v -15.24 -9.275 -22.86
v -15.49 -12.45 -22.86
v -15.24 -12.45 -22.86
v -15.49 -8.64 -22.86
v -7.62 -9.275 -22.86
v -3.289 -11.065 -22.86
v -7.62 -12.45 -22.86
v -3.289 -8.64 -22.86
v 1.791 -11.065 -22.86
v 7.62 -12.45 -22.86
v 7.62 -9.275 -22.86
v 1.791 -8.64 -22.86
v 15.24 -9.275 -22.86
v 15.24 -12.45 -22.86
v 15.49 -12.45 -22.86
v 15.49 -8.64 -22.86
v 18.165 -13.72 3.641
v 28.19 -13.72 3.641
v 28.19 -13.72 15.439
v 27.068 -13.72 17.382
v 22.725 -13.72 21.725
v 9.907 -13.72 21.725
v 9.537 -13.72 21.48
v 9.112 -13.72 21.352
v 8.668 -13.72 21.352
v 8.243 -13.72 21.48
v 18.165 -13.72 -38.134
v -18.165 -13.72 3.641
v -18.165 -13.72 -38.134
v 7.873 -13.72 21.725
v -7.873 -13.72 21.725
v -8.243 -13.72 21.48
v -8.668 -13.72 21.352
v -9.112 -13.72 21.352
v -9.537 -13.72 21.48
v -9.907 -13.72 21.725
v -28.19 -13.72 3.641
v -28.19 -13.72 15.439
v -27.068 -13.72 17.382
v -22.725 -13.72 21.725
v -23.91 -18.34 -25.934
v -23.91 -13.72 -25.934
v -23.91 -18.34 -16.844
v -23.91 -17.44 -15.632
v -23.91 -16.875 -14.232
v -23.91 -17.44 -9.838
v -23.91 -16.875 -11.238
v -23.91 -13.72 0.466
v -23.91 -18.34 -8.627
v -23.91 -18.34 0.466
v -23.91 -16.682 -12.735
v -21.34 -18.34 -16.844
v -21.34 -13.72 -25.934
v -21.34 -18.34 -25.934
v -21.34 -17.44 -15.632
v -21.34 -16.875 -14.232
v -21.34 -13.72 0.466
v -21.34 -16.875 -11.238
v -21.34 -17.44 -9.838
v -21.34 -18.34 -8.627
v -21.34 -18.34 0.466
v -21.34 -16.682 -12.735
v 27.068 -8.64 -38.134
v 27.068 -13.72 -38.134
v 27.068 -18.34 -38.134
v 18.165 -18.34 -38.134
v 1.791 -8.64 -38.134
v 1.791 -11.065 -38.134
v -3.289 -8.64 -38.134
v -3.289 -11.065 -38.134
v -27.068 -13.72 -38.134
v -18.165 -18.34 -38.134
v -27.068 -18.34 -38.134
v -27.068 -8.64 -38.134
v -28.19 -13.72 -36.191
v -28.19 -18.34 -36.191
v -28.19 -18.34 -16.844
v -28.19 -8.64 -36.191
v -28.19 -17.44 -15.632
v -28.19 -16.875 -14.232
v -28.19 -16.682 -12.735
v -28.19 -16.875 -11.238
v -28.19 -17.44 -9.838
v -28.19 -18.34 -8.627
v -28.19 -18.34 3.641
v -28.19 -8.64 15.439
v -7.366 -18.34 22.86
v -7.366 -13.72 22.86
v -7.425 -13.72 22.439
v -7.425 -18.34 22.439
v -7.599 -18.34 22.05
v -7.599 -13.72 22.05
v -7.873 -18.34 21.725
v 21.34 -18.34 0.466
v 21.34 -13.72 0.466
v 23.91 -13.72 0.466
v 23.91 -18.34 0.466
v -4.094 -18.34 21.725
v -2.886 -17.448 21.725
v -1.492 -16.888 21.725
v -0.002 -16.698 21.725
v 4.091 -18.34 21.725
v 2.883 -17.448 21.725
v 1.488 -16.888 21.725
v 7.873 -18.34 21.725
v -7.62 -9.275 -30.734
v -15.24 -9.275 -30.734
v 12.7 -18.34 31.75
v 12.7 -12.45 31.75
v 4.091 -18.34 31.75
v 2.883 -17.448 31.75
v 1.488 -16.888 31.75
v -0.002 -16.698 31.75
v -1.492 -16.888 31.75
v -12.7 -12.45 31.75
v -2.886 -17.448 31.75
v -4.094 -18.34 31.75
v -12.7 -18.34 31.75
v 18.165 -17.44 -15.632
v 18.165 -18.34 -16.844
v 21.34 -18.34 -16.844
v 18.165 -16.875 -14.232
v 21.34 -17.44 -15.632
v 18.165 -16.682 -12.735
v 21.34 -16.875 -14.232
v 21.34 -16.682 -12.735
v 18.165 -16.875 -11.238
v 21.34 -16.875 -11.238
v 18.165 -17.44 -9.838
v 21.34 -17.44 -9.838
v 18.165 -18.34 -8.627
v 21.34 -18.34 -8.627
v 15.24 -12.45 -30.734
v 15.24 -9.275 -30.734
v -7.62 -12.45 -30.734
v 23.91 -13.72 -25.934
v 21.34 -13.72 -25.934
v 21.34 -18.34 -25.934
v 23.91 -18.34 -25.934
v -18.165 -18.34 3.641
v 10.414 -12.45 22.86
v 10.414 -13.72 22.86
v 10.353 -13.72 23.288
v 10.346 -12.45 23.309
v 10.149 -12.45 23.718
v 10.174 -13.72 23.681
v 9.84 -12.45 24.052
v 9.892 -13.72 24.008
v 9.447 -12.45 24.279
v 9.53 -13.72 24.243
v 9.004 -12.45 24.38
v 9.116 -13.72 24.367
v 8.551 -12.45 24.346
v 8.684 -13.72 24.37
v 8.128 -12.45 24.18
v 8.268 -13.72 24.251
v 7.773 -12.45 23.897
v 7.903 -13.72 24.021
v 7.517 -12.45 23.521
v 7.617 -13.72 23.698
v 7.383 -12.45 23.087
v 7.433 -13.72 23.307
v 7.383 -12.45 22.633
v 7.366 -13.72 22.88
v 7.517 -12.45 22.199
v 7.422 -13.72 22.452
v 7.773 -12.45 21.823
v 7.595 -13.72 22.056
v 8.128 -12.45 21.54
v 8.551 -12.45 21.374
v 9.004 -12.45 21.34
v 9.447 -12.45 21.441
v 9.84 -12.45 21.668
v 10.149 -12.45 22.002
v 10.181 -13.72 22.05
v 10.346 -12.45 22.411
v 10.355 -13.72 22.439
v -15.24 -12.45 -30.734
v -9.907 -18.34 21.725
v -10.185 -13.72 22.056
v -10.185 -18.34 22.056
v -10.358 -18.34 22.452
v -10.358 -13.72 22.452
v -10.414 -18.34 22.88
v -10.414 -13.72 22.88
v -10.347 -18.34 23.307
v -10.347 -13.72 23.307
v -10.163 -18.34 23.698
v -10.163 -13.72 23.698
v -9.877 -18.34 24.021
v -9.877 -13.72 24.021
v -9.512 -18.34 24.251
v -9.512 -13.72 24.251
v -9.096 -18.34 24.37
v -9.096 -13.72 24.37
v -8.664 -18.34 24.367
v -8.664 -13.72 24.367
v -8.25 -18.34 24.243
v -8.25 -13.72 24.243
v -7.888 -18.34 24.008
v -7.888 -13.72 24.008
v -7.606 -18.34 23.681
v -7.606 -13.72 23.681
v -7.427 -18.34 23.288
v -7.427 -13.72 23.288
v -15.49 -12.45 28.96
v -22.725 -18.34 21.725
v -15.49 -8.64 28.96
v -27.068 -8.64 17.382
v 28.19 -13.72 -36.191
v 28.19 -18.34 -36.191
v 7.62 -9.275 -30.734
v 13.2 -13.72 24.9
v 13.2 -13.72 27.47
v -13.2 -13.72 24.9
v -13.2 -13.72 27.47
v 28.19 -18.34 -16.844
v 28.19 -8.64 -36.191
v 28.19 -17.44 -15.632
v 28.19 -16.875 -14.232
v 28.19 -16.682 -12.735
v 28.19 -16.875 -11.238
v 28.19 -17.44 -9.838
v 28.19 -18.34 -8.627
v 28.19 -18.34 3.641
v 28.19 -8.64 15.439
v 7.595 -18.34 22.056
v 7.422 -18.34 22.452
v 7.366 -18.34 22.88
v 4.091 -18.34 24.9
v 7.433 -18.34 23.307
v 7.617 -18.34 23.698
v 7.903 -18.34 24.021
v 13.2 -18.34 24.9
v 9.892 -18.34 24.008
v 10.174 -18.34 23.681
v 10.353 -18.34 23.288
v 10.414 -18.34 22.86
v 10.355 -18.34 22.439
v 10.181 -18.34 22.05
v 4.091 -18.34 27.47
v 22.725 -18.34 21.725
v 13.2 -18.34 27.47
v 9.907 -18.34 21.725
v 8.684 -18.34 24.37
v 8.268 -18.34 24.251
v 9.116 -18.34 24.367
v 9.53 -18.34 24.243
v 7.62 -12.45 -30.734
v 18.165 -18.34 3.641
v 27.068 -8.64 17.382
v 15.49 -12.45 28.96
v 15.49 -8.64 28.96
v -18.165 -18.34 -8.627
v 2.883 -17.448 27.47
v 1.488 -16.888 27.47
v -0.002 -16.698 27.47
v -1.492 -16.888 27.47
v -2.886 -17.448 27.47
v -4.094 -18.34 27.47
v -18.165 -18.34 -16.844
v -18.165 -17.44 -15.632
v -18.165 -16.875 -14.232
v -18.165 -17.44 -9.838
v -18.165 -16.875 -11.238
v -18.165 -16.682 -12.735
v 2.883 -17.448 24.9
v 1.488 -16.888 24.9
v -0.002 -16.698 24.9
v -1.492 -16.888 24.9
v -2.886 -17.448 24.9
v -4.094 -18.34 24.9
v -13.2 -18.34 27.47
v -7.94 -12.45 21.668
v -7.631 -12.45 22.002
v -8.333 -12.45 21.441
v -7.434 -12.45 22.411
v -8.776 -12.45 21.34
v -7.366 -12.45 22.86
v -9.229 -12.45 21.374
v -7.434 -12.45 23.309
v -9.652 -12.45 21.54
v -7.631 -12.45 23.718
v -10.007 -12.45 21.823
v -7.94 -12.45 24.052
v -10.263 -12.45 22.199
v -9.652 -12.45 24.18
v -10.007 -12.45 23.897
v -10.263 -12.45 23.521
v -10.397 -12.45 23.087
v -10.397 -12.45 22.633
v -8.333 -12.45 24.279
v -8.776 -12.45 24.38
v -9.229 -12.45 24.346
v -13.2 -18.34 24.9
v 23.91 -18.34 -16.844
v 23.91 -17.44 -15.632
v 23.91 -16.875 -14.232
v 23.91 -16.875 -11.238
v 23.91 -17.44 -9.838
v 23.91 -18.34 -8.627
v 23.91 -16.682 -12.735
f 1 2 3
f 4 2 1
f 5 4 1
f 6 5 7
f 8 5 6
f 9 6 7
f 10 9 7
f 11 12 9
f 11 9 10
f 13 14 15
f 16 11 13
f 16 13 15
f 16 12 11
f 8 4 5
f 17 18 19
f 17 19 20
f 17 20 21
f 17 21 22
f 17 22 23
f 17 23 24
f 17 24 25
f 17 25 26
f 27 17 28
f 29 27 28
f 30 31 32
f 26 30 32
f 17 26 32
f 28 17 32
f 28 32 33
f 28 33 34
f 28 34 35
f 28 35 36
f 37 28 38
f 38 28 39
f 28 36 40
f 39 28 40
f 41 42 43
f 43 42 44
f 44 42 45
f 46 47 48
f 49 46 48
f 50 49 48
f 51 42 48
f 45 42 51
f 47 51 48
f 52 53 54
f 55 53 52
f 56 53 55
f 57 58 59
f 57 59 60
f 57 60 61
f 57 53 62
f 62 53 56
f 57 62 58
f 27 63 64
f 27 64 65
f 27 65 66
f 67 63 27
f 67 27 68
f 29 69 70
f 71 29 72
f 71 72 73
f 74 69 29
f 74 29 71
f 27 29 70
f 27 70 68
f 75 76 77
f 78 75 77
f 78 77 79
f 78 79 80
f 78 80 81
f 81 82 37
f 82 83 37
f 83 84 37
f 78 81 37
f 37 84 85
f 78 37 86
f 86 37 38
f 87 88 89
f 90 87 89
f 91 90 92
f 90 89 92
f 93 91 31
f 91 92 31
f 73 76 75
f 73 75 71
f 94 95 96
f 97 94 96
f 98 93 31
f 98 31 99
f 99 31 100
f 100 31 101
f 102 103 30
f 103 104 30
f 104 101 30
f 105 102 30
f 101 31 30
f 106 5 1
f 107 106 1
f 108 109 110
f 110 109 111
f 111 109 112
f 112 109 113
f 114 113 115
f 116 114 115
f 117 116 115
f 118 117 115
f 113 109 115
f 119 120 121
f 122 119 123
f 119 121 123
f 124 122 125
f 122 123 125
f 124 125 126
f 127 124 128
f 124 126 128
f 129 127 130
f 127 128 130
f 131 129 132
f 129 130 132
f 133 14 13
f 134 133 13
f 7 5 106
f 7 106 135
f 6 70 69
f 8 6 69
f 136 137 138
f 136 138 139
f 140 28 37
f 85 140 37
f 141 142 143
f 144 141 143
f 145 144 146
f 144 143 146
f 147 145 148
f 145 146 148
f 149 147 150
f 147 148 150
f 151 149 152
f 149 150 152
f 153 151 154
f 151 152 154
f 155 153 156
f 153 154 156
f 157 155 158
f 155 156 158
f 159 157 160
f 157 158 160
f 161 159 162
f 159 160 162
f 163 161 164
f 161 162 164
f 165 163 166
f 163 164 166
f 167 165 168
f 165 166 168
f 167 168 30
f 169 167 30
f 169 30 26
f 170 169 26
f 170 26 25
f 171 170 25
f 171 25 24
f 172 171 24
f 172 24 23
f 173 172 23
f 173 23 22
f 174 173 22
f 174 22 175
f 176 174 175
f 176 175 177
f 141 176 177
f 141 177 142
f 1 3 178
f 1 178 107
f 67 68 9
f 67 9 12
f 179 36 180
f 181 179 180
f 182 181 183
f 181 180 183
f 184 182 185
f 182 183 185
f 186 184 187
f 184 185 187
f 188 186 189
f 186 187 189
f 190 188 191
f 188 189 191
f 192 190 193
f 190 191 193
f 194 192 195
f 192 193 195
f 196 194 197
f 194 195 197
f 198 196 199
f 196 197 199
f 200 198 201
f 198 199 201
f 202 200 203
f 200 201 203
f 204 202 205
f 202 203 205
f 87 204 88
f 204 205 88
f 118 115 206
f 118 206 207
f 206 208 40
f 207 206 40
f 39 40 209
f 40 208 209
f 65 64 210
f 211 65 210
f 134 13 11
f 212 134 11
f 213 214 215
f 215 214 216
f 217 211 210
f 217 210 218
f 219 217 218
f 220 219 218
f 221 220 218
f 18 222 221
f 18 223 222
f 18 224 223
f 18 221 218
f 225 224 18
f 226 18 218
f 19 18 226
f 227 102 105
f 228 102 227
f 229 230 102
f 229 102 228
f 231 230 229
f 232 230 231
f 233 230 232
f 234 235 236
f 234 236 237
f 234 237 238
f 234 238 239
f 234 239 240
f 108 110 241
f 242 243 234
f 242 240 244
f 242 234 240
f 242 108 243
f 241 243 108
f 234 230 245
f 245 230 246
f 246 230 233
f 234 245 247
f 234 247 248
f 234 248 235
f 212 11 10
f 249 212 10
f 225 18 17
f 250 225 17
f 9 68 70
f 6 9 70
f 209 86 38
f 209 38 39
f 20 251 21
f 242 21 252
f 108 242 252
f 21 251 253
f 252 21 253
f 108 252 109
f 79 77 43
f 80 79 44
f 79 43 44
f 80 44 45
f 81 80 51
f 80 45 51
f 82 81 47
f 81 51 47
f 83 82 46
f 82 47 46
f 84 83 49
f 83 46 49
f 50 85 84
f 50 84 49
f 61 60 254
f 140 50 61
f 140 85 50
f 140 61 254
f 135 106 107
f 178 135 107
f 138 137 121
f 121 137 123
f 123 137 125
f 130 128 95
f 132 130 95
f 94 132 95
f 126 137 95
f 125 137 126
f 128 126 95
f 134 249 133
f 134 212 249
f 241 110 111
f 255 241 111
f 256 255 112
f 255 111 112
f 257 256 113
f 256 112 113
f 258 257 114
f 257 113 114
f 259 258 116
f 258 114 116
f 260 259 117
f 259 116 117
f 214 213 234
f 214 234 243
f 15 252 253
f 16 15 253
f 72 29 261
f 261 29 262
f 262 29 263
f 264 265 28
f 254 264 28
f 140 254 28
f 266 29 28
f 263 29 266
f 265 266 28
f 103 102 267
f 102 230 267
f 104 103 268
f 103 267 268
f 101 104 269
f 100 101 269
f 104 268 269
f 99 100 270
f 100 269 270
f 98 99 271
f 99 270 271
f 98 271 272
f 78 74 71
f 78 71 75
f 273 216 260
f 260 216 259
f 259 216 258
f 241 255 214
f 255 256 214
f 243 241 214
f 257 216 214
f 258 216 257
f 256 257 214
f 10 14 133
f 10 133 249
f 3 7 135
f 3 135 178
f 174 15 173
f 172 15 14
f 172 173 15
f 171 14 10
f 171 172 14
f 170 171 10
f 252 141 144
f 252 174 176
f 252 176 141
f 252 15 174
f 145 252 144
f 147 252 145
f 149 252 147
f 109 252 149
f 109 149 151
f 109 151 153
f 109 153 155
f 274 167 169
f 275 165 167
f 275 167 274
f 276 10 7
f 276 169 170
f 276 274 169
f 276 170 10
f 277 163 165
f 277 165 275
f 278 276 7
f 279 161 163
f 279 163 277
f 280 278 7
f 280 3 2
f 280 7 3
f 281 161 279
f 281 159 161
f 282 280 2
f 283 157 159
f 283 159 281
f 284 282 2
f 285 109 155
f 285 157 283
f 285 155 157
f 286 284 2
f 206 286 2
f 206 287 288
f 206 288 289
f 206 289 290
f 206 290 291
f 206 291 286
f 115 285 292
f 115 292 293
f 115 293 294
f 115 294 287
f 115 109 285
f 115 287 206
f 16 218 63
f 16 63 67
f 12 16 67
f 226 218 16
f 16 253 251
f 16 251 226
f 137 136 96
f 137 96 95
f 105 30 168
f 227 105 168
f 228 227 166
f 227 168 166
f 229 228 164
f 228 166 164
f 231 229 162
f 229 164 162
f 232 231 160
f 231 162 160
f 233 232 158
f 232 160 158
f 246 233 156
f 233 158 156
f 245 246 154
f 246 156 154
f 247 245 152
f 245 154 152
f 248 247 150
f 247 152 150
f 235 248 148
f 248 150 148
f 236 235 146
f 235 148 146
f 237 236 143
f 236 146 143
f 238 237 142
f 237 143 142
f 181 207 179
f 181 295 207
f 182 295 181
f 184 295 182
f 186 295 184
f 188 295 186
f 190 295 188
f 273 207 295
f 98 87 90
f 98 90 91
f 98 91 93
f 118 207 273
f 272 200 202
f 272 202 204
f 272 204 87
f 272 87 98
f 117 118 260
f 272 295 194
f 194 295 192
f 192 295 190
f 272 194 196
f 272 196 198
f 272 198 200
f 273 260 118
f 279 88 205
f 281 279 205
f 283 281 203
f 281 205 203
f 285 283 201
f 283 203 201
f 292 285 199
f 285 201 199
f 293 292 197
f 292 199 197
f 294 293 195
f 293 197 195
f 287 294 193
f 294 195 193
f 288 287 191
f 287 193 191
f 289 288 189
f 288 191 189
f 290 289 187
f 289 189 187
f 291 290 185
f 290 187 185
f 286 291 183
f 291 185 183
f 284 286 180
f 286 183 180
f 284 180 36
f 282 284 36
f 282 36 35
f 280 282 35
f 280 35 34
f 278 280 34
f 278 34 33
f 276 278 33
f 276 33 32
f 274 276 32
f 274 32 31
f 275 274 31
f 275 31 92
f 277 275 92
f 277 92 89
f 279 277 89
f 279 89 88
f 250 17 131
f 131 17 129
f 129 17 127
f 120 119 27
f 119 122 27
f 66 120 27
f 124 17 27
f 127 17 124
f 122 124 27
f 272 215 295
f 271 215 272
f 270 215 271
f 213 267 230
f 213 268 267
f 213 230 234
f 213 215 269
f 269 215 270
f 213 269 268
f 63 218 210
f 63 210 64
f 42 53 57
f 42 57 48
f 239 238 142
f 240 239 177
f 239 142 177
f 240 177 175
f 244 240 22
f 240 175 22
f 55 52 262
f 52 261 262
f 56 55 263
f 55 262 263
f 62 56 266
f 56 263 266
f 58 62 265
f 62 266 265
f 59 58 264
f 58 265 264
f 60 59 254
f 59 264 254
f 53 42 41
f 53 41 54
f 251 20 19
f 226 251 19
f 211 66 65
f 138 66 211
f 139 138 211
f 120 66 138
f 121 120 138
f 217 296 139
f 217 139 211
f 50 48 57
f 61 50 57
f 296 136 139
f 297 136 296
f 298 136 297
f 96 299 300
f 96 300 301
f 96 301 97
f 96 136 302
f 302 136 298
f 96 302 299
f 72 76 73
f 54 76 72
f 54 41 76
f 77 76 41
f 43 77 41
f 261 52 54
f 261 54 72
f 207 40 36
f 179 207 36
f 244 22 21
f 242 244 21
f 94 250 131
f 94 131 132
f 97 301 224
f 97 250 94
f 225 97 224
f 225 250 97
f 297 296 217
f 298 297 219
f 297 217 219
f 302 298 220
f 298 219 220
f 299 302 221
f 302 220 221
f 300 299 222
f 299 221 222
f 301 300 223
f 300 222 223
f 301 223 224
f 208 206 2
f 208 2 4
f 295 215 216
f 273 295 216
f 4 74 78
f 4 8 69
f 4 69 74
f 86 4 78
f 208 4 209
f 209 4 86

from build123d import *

# Parameters (mm, degrees)
BOSS_EXTRUDE1_DEPTH  = 3.81
SKETCH2_W            = 30.48
SKETCH2_H            = 48.26
CUT_EXTRUDE1_DEPTH   = 3.81
SKETCH4_W            = 30.48
SKETCH4_H            = 3.81
CUT_EXTRUDE2_DEPTH   = 27.94
SKETCH5_W            = 0.25
SKETCH5_H            = 3.81
CUT_EXTRUDE3_DEPTH   = 53.07
CUT_EXTRUDE4_DEPTH   = 7.874
BOSS_EXTRUDE2_DEPTH  = 1.27
SKETCH8_R            = 1.524
CUT_EXTRUDE6_DEPTH   = 6.08
SKETCH9_W            = 5.08
SKETCH9_H            = 5.08
CUT_EXTRUDE7_DEPTH   = 70.883682204
SKETCH10_OUTSIDE_W   = 96.904
SKETCH10_OUTSIDE_H   = 92.332
SKETCH10_OUTSIDE_W_2 = 56.38
SKETCH10_OUTSIDE_H_2 = 76.267364408
CUT_EXTRUDE8_DEPTH   = 6.08
SKETCH11_W           = 26.4
SKETCH11_H           = 2.57
SKETCH11_W_2         = 2.57
SKETCH11_H_2         = 26.4
BOSS_EXTRUDE4_DEPTH  = 4.62
SKETCH12_R           = 5.92
CUT_EXTRUDE9_DEPTH   = 57.38
SKETCH13_R           = 5.92
CUT_EXTRUDE10_DEPTH  = 70.883682204


with BuildPart() as part:
    # Sketch1 → Boss-Extrude1 (new body)
    with BuildSketch(Plane.XZ.offset(12.45)):
        Polygon((-12.7, 31.75), (12.7, 31.75), (27.068409794, 17.381590206), (37.228409794, -0.216045999), (37.228409794, -20.536045999), (27.068409794, -38.133682204), (-27.068409794, -38.133682204), (-37.228409794, -20.536045999), (-37.228409794, -0.216045999), (-27.068409794, 17.381590206), align=None)
    extrude(amount=-BOSS_EXTRUDE1_DEPTH)

    # Sketch2 → Cut-Extrude1 (cut)
    with BuildSketch(Plane.XZ.offset(12.45)):
        with Locations((0, 1.27)):
            Rectangle(SKETCH2_W, SKETCH2_H)
    extrude(amount=-CUT_EXTRUDE1_DEPTH, mode=Mode.SUBTRACT)

    # Sketch4 → Cut-Extrude2 (cut)
    with BuildSketch(Plane(origin=(0, 0, 25.4), x_dir=(-1, 0, 0), z_dir=(0, 0, -1))):
        with Locations((0, -10.545)):
            Rectangle(SKETCH4_W, SKETCH4_H)
    extrude(amount=-CUT_EXTRUDE2_DEPTH, mode=Mode.SUBTRACT)

    # Sketch5 → Cut-Extrude3 (cut, through all)
    with BuildSketch(Plane.XY.offset(-22.86)):
        with Locations((-15.365, -10.545)):
            Rectangle(SKETCH5_W, SKETCH5_H)
        with Locations((15.365, -10.545)):
            Rectangle(SKETCH5_W, SKETCH5_H)
    extrude(amount=CUT_EXTRUDE3_DEPTH, mode=Mode.SUBTRACT)

    # Sketch6 → Cut-Extrude4 (cut)
    with BuildSketch(Plane.XY.offset(-22.86)):
        Polygon((7.62, -12.45), (15.24, -12.45), (15.24, -9.275), (11.557, -9.275), (7.62, -9.275), align=None)
        Polygon((-15.24, -12.45), (-15.24, -9.275), (-11.557, -9.275), (-7.62, -9.275), (-7.62, -12.45), align=None)
    extrude(amount=-CUT_EXTRUDE4_DEPTH, mode=Mode.SUBTRACT)

    # Sketch1_3 → Boss-Extrude2 (add)
    with BuildSketch(Plane.XZ.offset(12.45)):
        Polygon((-12.7, 31.75), (12.7, 31.75), (27.068409794, 17.381590206), (37.228409794, -0.216045999), (37.228409794, -20.536045999), (27.068409794, -38.133682204), (-27.068409794, -38.133682204), (-37.228409794, -20.536045999), (-37.228409794, -0.216045999), (-27.068409794, 17.381590206), align=None)
    extrude(amount=BOSS_EXTRUDE2_DEPTH)

    # Sketch8 → Cut-Extrude6 (cut, through all)
    with BuildSketch(Plane.XZ.offset(13.72)):
        with Locations((-8.89, 22.86)):
            Circle(SKETCH8_R)
        with Locations((8.89, 22.86)):
            Circle(SKETCH8_R)
    extrude(amount=-CUT_EXTRUDE6_DEPTH, mode=Mode.SUBTRACT)

    # Sketch9 → Cut-Extrude7 (cut, through all)
    with BuildSketch(Plane(origin=(0, 0, -38.133682204), x_dir=(-1, 0, 0), z_dir=(0, 0, -1))):
        with Locations((0.7493, -8.5252)):
            Rectangle(SKETCH9_W, SKETCH9_H)
    extrude(amount=-CUT_EXTRUDE7_DEPTH, mode=Mode.SUBTRACT)

    # Sketch10 outside → Cut-Extrude8 (cut, through all)
    with BuildSketch(Plane.XZ.offset(13.72)):
        with Locations((0, -3.192)):
            Rectangle(SKETCH10_OUTSIDE_W, SKETCH10_OUTSIDE_H)
        Rectangle(SKETCH10_OUTSIDE_W_2, SKETCH10_OUTSIDE_H_2, mode=Mode.SUBTRACT)
    extrude(amount=-CUT_EXTRUDE8_DEPTH, mode=Mode.SUBTRACT)

    # Sketch11 → Boss-Extrude4 (add)
    with BuildSketch(Plane.XZ.offset(13.72)):
        with BuildLine():
            Line((22.725, 21.725), (12.7, 31.75))
            Line((12.7, 31.75), (-12.7, 31.75))
            Line((-12.7, 31.75), (-22.725, 21.725))
            Line((-22.725, 21.725), (-9.907030481, 21.725))
            ThreePointArc((-9.907030481, 21.725), (-9.511539036, 24.251497476), (-7.366, 22.86))
            ThreePointArc((-7.366, 22.86), (-7.498502524, 22.238460964), (-7.872969519, 21.725))
            Line((-7.872969519, 21.725), (7.872969519, 21.725))
            ThreePointArc((7.872969519, 21.725), (8.268460964, 24.251497476), (10.414, 22.86))
            ThreePointArc((10.414, 22.86), (10.281497476, 22.238460964), (9.907030481, 21.725))
            Line((9.907030481, 21.725), (22.725, 21.725))
        make_face()
        with Locations((0, 26.185)):
            Rectangle(SKETCH11_W, SKETCH11_H, mode=Mode.SUBTRACT)
        Polygon((-27.068409794, -38.133682204), (-18.165, -38.133682204), (-18.165, 3.641317796), (-28.19, 3.641317796), (-28.19, -36.191030981), align=None)
        with Locations((-22.625, -12.733682204)):
            Rectangle(SKETCH11_W_2, SKETCH11_H_2, mode=Mode.SUBTRACT)
        Polygon((28.19, -36.191030981), (28.19, 3.641317796), (18.165, 3.641317796), (18.165, -38.133682204), (27.068409794, -38.133682204), align=None)
        with Locations((22.625, -12.733682204)):
            Rectangle(SKETCH11_W_2, SKETCH11_H_2, mode=Mode.SUBTRACT)
    extrude(amount=BOSS_EXTRUDE4_DEPTH)

    # Sketch12 → Cut-Extrude9 (cut, through all)
    with BuildSketch(Plane(origin=(28.19, 0, 0), x_dir=(0, 0, -1), z_dir=(1, 0, 0))):
        with Locations((12.735281649, -22.602468851)):
            Circle(SKETCH12_R)
    extrude(amount=-CUT_EXTRUDE9_DEPTH, mode=Mode.SUBTRACT)

    # Sketch13 → Cut-Extrude10 (cut, through all)
    with BuildSketch(Plane.XY.offset(31.75)):
        with Locations((-0.001599445, -22.617531149)):
            Circle(SKETCH13_R)
    extrude(amount=-CUT_EXTRUDE10_DEPTH, mode=Mode.SUBTRACT)


solid = part.part
